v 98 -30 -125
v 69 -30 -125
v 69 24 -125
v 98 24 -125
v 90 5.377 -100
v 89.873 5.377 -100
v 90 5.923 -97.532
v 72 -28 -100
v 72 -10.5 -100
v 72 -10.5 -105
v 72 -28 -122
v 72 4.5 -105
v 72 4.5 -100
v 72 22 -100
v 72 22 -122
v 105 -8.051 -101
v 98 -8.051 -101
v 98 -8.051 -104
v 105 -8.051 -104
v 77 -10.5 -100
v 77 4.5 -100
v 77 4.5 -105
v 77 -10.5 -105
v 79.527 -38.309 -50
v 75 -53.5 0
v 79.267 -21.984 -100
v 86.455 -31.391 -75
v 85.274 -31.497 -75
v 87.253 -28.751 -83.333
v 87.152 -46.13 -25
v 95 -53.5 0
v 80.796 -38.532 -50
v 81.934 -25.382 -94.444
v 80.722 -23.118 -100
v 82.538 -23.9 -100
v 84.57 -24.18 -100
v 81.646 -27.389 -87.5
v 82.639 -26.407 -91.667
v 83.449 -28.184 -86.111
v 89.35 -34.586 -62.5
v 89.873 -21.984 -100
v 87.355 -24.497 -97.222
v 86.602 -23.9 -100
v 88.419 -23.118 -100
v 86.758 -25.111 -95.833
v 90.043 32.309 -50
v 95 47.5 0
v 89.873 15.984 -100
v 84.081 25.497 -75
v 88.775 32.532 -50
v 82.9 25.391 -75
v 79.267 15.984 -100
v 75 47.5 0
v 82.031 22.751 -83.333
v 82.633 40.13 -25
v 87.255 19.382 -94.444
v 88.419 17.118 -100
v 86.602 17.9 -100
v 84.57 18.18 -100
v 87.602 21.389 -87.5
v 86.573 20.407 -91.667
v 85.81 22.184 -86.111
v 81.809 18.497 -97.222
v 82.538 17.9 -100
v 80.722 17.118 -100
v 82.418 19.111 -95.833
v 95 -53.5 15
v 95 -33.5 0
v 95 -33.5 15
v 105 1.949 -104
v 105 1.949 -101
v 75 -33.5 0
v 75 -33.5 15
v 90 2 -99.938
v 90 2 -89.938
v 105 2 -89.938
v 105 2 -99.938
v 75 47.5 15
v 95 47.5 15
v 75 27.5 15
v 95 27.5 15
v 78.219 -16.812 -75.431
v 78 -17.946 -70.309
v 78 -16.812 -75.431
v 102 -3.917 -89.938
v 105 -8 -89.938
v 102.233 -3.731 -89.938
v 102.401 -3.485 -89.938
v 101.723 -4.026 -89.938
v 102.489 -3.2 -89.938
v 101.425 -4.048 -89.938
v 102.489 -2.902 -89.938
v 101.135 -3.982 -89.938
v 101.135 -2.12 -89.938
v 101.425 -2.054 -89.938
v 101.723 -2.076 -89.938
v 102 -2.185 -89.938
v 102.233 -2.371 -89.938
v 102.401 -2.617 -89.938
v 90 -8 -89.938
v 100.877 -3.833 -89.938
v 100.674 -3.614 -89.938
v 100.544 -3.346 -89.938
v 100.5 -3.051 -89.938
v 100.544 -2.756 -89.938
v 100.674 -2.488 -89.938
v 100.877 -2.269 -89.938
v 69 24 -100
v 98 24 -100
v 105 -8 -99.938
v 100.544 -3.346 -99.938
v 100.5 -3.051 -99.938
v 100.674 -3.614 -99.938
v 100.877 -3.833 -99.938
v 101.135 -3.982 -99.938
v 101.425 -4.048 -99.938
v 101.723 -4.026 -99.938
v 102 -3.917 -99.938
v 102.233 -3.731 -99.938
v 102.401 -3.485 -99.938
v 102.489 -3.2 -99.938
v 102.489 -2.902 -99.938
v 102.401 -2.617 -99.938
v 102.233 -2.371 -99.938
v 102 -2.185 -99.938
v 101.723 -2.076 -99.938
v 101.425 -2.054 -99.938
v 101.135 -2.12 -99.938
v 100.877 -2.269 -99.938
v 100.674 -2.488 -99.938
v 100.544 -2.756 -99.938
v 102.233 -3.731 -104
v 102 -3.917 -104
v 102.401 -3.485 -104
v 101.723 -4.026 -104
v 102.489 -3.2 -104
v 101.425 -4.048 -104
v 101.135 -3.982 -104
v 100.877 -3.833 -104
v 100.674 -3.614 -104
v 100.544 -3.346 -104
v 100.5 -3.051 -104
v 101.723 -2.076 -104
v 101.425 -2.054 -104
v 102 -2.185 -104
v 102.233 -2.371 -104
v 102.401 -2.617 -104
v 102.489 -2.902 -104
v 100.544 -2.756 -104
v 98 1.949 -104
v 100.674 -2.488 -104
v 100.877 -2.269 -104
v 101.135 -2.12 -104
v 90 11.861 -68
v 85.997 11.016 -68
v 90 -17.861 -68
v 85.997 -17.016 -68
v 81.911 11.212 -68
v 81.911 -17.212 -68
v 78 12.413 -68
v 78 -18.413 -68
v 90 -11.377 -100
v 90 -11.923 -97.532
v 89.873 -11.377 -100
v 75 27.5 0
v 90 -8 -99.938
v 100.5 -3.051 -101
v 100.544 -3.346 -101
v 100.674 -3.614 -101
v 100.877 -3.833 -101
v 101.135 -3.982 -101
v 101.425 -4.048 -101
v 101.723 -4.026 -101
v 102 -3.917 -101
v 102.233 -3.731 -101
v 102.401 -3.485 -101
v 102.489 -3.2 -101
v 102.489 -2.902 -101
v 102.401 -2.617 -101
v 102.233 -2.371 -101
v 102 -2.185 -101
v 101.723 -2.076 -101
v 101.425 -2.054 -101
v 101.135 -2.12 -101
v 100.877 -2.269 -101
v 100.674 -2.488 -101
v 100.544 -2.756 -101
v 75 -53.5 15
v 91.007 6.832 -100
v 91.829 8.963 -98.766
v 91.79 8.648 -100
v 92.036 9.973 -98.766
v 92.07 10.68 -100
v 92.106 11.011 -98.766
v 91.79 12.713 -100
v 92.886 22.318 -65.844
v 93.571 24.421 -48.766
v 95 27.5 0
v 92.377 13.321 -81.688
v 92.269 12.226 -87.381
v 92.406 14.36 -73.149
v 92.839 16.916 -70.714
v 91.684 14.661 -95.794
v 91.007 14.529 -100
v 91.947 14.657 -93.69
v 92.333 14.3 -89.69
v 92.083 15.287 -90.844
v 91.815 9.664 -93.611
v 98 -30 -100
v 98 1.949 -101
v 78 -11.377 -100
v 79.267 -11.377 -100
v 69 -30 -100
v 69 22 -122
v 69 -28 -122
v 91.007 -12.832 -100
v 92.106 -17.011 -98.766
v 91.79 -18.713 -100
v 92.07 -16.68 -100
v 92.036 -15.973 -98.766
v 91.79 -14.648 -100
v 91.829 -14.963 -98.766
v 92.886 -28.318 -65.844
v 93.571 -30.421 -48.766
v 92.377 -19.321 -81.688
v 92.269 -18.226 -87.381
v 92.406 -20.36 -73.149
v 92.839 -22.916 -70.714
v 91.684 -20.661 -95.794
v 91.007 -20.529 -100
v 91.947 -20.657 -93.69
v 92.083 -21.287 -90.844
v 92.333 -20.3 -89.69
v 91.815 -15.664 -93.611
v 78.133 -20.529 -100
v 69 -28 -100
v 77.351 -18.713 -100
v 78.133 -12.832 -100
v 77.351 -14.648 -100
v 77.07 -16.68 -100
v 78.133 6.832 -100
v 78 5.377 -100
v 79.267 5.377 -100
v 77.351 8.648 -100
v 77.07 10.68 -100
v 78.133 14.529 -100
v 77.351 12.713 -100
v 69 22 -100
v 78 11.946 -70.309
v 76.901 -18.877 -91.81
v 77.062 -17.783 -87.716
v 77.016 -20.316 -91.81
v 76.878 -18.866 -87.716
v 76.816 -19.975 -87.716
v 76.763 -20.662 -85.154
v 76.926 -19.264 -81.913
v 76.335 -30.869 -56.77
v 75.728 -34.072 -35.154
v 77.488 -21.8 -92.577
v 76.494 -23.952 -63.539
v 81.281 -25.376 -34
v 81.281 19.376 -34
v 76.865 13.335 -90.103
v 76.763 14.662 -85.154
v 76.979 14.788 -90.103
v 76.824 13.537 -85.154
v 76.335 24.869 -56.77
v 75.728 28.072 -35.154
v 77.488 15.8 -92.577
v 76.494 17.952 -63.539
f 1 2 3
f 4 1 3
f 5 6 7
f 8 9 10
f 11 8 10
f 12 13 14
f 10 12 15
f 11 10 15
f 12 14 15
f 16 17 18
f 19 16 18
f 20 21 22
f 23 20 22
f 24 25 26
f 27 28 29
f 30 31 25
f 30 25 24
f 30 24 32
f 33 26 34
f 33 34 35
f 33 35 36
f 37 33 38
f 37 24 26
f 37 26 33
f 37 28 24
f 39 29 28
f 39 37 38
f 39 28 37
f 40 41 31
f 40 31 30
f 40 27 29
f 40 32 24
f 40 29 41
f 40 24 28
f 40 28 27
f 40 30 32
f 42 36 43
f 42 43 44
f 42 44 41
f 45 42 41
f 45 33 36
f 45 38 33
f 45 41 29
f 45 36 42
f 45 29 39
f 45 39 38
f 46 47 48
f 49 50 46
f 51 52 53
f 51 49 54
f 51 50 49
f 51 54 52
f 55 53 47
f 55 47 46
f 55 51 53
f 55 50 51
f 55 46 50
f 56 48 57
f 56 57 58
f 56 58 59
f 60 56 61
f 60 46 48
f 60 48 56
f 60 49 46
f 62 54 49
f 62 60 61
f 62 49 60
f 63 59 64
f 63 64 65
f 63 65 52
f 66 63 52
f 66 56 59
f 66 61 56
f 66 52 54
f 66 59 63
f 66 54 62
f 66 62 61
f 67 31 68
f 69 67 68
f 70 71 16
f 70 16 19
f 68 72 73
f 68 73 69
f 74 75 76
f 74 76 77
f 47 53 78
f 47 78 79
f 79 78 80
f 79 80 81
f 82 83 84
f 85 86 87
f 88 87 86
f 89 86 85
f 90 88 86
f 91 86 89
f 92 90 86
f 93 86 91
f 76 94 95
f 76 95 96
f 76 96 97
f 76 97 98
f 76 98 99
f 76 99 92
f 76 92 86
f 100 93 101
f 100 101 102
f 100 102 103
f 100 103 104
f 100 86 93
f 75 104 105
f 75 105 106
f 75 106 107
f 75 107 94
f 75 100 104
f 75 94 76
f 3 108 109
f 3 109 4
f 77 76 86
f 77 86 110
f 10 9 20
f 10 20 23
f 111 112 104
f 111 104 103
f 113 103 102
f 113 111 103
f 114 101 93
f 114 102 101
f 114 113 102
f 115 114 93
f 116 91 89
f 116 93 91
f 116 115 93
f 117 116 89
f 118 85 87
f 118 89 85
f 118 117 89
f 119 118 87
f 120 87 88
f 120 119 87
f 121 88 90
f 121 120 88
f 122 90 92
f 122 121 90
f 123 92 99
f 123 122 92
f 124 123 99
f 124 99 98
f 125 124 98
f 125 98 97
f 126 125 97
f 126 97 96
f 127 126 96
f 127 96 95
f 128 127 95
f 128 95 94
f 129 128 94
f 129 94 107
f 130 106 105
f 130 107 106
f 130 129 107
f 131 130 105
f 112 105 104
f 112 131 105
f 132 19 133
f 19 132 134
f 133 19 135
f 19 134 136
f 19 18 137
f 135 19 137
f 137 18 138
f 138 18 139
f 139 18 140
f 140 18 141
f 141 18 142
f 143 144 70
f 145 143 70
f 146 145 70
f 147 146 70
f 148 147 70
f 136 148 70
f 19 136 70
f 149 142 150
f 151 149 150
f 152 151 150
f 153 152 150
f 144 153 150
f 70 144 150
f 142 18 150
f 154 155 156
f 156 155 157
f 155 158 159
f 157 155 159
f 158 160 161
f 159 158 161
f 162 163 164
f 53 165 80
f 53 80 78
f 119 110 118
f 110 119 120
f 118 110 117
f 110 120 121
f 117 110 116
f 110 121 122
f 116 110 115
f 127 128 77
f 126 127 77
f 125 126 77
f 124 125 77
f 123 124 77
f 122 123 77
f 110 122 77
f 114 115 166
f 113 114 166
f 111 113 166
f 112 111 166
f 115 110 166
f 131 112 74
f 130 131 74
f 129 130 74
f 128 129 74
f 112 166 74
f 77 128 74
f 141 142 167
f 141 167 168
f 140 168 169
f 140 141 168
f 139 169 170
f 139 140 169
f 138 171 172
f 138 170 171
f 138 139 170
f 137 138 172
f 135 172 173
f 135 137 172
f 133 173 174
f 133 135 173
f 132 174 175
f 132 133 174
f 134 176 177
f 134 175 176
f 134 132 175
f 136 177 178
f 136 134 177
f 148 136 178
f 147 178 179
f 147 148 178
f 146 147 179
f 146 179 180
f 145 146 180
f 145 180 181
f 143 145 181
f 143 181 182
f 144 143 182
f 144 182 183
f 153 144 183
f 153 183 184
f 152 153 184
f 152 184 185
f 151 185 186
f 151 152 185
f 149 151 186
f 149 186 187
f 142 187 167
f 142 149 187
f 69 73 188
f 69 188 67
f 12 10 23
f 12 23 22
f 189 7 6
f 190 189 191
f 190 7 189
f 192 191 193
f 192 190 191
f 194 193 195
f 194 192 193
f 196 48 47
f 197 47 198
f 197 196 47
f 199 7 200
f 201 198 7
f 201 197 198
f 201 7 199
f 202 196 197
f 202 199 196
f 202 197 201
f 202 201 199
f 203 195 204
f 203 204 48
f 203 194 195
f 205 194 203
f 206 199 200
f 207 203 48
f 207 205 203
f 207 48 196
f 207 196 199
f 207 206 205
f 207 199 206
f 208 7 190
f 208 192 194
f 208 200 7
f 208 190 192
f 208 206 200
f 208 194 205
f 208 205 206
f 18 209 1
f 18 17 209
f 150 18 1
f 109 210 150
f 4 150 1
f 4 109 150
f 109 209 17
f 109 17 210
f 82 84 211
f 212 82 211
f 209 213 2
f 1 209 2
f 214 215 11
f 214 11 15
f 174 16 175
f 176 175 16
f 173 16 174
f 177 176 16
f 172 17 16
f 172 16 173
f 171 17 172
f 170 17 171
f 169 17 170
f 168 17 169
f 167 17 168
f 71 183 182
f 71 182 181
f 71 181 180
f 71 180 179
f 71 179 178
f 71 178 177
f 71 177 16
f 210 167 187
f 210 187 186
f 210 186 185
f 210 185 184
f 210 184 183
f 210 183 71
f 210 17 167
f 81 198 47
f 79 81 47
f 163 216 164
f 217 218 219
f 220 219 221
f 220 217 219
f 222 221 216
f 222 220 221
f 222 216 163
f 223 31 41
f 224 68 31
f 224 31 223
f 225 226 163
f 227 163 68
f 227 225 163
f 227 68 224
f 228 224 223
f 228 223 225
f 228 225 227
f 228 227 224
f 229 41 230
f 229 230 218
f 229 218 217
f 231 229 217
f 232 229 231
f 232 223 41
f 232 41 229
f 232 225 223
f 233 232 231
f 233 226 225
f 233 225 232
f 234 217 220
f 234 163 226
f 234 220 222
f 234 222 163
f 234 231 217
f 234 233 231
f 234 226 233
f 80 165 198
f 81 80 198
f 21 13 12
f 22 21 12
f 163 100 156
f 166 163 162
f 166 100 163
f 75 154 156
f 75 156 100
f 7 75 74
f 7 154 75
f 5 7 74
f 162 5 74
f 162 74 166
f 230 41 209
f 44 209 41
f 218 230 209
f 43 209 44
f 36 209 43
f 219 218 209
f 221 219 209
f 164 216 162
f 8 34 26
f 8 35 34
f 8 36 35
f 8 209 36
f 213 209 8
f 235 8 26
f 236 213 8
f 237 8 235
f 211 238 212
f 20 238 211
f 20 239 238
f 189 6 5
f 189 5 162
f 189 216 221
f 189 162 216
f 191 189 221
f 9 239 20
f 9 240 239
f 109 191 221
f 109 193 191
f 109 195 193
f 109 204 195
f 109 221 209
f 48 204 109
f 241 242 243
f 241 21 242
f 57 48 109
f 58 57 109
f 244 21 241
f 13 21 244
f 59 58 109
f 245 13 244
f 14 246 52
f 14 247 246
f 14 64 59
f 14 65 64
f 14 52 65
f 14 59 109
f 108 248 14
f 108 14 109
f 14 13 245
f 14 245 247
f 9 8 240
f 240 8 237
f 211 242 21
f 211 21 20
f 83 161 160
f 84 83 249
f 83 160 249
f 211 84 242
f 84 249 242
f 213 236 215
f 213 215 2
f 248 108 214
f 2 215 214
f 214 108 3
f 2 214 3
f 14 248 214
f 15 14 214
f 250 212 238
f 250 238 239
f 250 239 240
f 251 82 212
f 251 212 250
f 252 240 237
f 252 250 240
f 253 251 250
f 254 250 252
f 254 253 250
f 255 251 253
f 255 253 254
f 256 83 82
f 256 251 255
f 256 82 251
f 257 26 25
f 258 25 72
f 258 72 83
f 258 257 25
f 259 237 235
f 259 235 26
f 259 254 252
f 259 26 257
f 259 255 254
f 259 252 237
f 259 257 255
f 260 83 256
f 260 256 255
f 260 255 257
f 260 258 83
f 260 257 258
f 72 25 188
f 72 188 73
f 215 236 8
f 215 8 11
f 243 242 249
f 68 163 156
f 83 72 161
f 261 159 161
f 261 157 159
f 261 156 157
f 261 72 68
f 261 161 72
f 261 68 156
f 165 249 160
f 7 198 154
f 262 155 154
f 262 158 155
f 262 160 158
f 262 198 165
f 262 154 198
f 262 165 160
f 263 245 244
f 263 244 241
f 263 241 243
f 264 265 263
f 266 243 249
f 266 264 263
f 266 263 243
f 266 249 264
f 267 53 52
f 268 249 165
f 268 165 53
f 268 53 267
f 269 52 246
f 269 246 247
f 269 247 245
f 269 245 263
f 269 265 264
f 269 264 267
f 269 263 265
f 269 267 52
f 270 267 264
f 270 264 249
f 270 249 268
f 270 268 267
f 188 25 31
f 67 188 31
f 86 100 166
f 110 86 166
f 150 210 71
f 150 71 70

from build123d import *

# Parameters (mm, degrees)
EXTRUDE_6_DEPTH           = 3
EXTRUDE_6_DEPTH_BACK      = 26
SKETCH_13_W               = 25
SKETCH_13_H               = 54
SKETCH_16_W               = 22
SKETCH_16_H               = 50
CUT_EXTRUDE_9_DEPTH       = 3
SKETCH_17_W               = 5
SKETCH_17_H               = 15
CUT_EXTRUDE_10_DEPTH      = 8
EXTRUDE_14_OUTLINE_W      = 20
EXTRUDE_14_OUTLINE_H      = 20
EXTRUDE_14_DEPTH          = 15
EXTRUDE_14_3_OUTLINE_W    = 20
EXTRUDE_14_3_OUTLINE_H    = 20
EXTRUDE_14_3_DEPTH        = 15
EXTRUDE_15_DEPTH          = 5
EXTRUDE_15_DEPTH_BACK     = 7
SKETCH_25_W               = 10
SKETCH_25_H               = 10
EXTRUDE_17_DEPTH          = 20
SKETCH_26_W               = 3
SKETCH_26_H               = 10
EXTRUDE_18_DEPTH          = 10
CUT_EXTRUDE_11_DEPTH      = 10.5
CUT_EXTRUDE_11_DEPTH_BACK = 10.5
SKETCH_28_R               = 1


with BuildPart() as part:
    # 草圖13 → 填料-伸長6 (new, two sides: drawn at the far end of the back side and taken through both)
    with BuildSketch(Plane(origin=(95, 0, 0), x_dir=(0, 0, -1), z_dir=(1, 0, 0)).offset(-EXTRUDE_6_DEPTH_BACK)):
        with Locations((112.5, -3)):
            Rectangle(SKETCH_13_W, SKETCH_13_H)
    extrude(amount=EXTRUDE_6_DEPTH + EXTRUDE_6_DEPTH_BACK)

    # 草圖16 → 除料-伸長9 (cut)
    with BuildSketch(Plane(origin=(69, 0, 0), x_dir=(0, 0, -1), z_dir=(1, 0, 0))):
        with Locations((111, -3)):
            Rectangle(SKETCH_16_W, SKETCH_16_H)
    extrude(amount=CUT_EXTRUDE_9_DEPTH, mode=Mode.SUBTRACT)

    # 草圖17 → 除料-伸長10 (cut)
    with BuildSketch(Plane(origin=(69, 0, 0), x_dir=(0, 0, -1), z_dir=(1, 0, 0))):
        with Locations((102.5, -3)):
            Rectangle(SKETCH_17_W, SKETCH_17_H)
    extrude(amount=CUT_EXTRUDE_10_DEPTH, mode=Mode.SUBTRACT)



with BuildPart() as body_2:
    # Knit 1: read off the stored shape, not the designer's step
    # Knit 1: loft between two sections, ruled curve by curve
    knit_1_from = [
        Edge.make_bspline([(79.266895317, 5.377196179, -100), (79.579395317, 5.064696179, -100), (79.931362244, 4.768290315, -100), (80.709511323, 4.233165726, -100), (81.135733214, 3.994620259, -100), (82.046998926, 3.600245646, -100), (82.531971403, 3.444609801, -100), (83.534778832, 3.234670337, -100), (84.052429223, 3.180497037, -100), (85.087963129, 3.180497037, -100), (85.60561352, 3.234670337, -100), (86.608420949, 3.444609801, -100), (87.093393426, 3.600245646, -100), (88.004659138, 3.994620259, -100), (88.430881029, 4.233165726, -100), (89.209030109, 4.768290315, -100), (89.560997035, 5.064696179, -100), (89.873497035, 5.377196179, -100)], [0, 0, 0, 0, 0.125, 0.125, 0.25, 0.25, 0.375, 0.375, 0.5, 0.5, 0.625, 0.625, 0.75, 0.75, 0.875, 0.875, 1, 1, 1, 1], 3),
        Edge.make_bspline([(89.873497035, 5.377196179, -100), (90.185997035, 5.689696179, -100), (90.482402899, 6.041663105, -100), (91.017527488, 6.819812184, -100), (91.256072955, 7.246034075, -100), (91.650447568, 8.157299787, -100), (91.806083413, 8.642272265, -100), (92.016022877, 9.645079694, -100), (92.070196176, 10.162730084, -100), (92.070196176, 11.19826399, -100), (92.016022877, 11.715914381, -100), (91.806083413, 12.71872181, -100), (91.650447568, 13.203694288, -100), (91.256072955, 14.11496, -100), (91.017527488, 14.541181891, -100), (90.482402899, 15.31933097, -100), (90.185997035, 15.671297896, -100), (89.873497035, 15.983797896, -100)], [0, 0, 0, 0, 0.125, 0.125, 0.25, 0.25, 0.375, 0.375, 0.5, 0.5, 0.625, 0.625, 0.75, 0.75, 0.875, 0.875, 1, 1, 1, 1], 3),
        Edge.make_bspline([(79.266895317, 15.983797896, -100), (78.954395317, 15.671297896, -100), (78.657989454, 15.31933097, -100), (78.122864864, 14.541181891, -100), (77.884319398, 14.11496, -100), (77.489944785, 13.203694288, -100), (77.334308939, 12.71872181, -100), (77.124369476, 11.715914381, -100), (77.070196176, 11.19826399, -100), (77.070196176, 10.162730084, -100), (77.124369476, 9.645079694, -100), (77.334308939, 8.642272265, -100), (77.489944785, 8.157299787, -100), (77.884319398, 7.246034075, -100), (78.122864864, 6.819812184, -100), (78.657989454, 6.041663105, -100), (78.954395317, 5.689696179, -100), (79.266895317, 5.377196179, -100)], [0, 0, 0, 0, 0.125, 0.125, 0.25, 0.25, 0.375, 0.375, 0.5, 0.5, 0.625, 0.625, 0.75, 0.75, 0.875, 0.875, 1, 1, 1, 1], 3),
        Edge.make_bspline([(89.873497035, 15.983797896, -100), (89.560997035, 16.296297896, -100), (89.209030109, 16.59270376, -100), (88.430881029, 17.127828349, -100), (88.004659138, 17.366373816, -100), (87.093393426, 17.760748429, -100), (86.608420949, 17.916384274, -100), (85.60561352, 18.126323738, -100), (85.087963129, 18.180497037, -100), (84.052429223, 18.180497037, -100), (83.534778832, 18.126323738, -100), (82.531971403, 17.916384274, -100), (82.046998926, 17.760748429, -100), (81.135733214, 17.366373816, -100), (80.709511323, 17.127828349, -100), (79.931362244, 16.59270376, -100), (79.579395317, 16.296297896, -100), (79.266895317, 15.983797896, -100)], [0, 0, 0, 0, 0.125, 0.125, 0.25, 0.25, 0.375, 0.375, 0.5, 0.5, 0.625, 0.625, 0.75, 0.75, 0.875, 0.875, 1, 1, 1, 1], 3),
    ]
    knit_1_to = [
        Edge.make_bspline([(75, 27.5, 0), (75.833333333, 27.5, 0), (76.666666667, 27.5, 0), (78.333333333, 27.5, 0), (79.166666667, 27.5, 0), (80.833333333, 27.5, 0), (81.666666667, 27.5, 0), (83.333333333, 27.5, 0), (84.166666667, 27.5, 0), (85.833333333, 27.5, 0), (86.666666667, 27.5, 0), (88.333333333, 27.5, 0), (89.166666667, 27.5, 0), (90.833333333, 27.5, 0), (91.666666667, 27.5, 0), (93.333333333, 27.5, 0), (94.166666667, 27.5, 0), (95, 27.5, 0)], [0, 0, 0, 0, 0.125, 0.125, 0.25, 0.25, 0.375, 0.375, 0.5, 0.5, 0.625, 0.625, 0.75, 0.75, 0.875, 0.875, 1, 1, 1, 1], 3),
        Edge.make_bspline([(95, 27.5, 0), (95, 28.333333333, 0), (95, 29.166666667, 0), (95, 30.833333333, 0), (95, 31.666666667, 0), (95, 33.333333333, 0), (95, 34.166666667, 0), (95, 35.833333333, 0), (95, 36.666666667, 0), (95, 38.333333333, 0), (95, 39.166666667, 0), (95, 40.833333333, 0), (95, 41.666666667, 0), (95, 43.333333333, 0), (95, 44.166666667, 0), (95, 45.833333333, 0), (95, 46.666666667, 0), (95, 47.5, 0)], [0, 0, 0, 0, 0.125, 0.125, 0.25, 0.25, 0.375, 0.375, 0.5, 0.5, 0.625, 0.625, 0.75, 0.75, 0.875, 0.875, 1, 1, 1, 1], 3),
        Edge.make_bspline([(75, 47.5, 0), (75, 46.666666667, 0), (75, 45.833333333, 0), (75, 44.166666667, 0), (75, 43.333333333, 0), (75, 41.666666667, 0), (75, 40.833333333, 0), (75, 39.166666667, 0), (75, 38.333333333, 0), (75, 36.666666667, 0), (75, 35.833333333, 0), (75, 34.166666667, 0), (75, 33.333333333, 0), (75, 31.666666667, 0), (75, 30.833333333, 0), (75, 29.166666667, 0), (75, 28.333333333, 0), (75, 27.5, 0)], [0, 0, 0, 0, 0.125, 0.125, 0.25, 0.25, 0.375, 0.375, 0.5, 0.5, 0.625, 0.625, 0.75, 0.75, 0.875, 0.875, 1, 1, 1, 1], 3),
        Edge.make_bspline([(95, 47.5, 0), (94.166666667, 47.5, 0), (93.333333333, 47.5, 0), (91.666666667, 47.5, 0), (90.833333333, 47.5, 0), (89.166666667, 47.5, 0), (88.333333333, 47.5, 0), (86.666666667, 47.5, 0), (85.833333333, 47.5, 0), (84.166666667, 47.5, 0), (83.333333333, 47.5, 0), (81.666666667, 47.5, 0), (80.833333333, 47.5, 0), (79.166666667, 47.5, 0), (78.333333333, 47.5, 0), (76.666666667, 47.5, 0), (75.833333333, 47.5, 0), (75, 47.5, 0)], [0, 0, 0, 0, 0.125, 0.125, 0.25, 0.25, 0.375, 0.375, 0.5, 0.5, 0.625, 0.625, 0.75, 0.75, 0.875, 0.875, 1, 1, 1, 1], 3),
    ]
    knit_1 = Solid(Shell([*[Face.make_surface_from_curves(knit_1_from[k], knit_1_to[k]) for k in range(4)], Face(Wire(knit_1_from)), Face(Wire(knit_1_to))]))
    add(knit_1)

    # Extrude 14 3 outline → Extrude 14 3 (add)
    with BuildSketch(Plane.XY):
        with Locations((85, 37.5)):
            Rectangle(EXTRUDE_14_3_OUTLINE_W, EXTRUDE_14_3_OUTLINE_H)
    extrude(amount=EXTRUDE_14_3_DEPTH)


with BuildPart() as body_3:
    # 填料-伸長14: read off the stored shape, not the designer's step
    # 填料-伸長14 outline → 填料-伸長14 (new body)
    with BuildSketch(Plane.XY):
        with Locations((85, -43.5)):
            Rectangle(EXTRUDE_14_OUTLINE_W, EXTRUDE_14_OUTLINE_H)
    extrude(amount=EXTRUDE_14_DEPTH)

    # Extrude 14 2: loft between two sections, ruled curve by curve
    extrude_14_2_from = [
        Edge.make_bspline([(79.266895317, -21.983797896, -100), (79.579395317, -22.296297896, -100), (79.931362244, -22.59270376, -100), (80.709511323, -23.127828349, -100), (81.135733214, -23.366373816, -100), (82.046998926, -23.760748429, -100), (82.531971403, -23.916384274, -100), (83.534778832, -24.126323738, -100), (84.052429223, -24.180497037, -100), (85.087963129, -24.180497037, -100), (85.60561352, -24.126323738, -100), (86.608420949, -23.916384274, -100), (87.093393426, -23.760748429, -100), (88.004659138, -23.366373816, -100), (88.430881029, -23.127828349, -100), (89.209030109, -22.59270376, -100), (89.560997035, -22.296297896, -100), (89.873497035, -21.983797896, -100)], [0, 0, 0, 0, 0.125, 0.125, 0.25, 0.25, 0.375, 0.375, 0.5, 0.5, 0.625, 0.625, 0.75, 0.75, 0.875, 0.875, 1, 1, 1, 1], 3),
        Edge.make_bspline([(89.873497035, -21.983797896, -100), (90.185997035, -21.671297896, -100), (90.482402899, -21.31933097, -100), (91.017527488, -20.541181891, -100), (91.256072955, -20.11496, -100), (91.650447568, -19.203694288, -100), (91.806083413, -18.71872181, -100), (92.016022877, -17.715914381, -100), (92.070196176, -17.19826399, -100), (92.070196176, -16.162730084, -100), (92.016022877, -15.645079694, -100), (91.806083413, -14.642272265, -100), (91.650447568, -14.157299787, -100), (91.256072955, -13.246034075, -100), (91.017527488, -12.819812184, -100), (90.482402899, -12.041663105, -100), (90.185997035, -11.689696179, -100), (89.873497035, -11.377196179, -100)], [0, 0, 0, 0, 0.125, 0.125, 0.25, 0.25, 0.375, 0.375, 0.5, 0.5, 0.625, 0.625, 0.75, 0.75, 0.875, 0.875, 1, 1, 1, 1], 3),
        Edge.make_bspline([(79.266895317, -11.377196179, -100), (78.954395317, -11.689696179, -100), (78.657989454, -12.041663105, -100), (78.122864864, -12.819812184, -100), (77.884319398, -13.246034075, -100), (77.489944785, -14.157299787, -100), (77.334308939, -14.642272265, -100), (77.124369476, -15.645079694, -100), (77.070196176, -16.162730084, -100), (77.070196176, -17.19826399, -100), (77.124369476, -17.715914381, -100), (77.334308939, -18.71872181, -100), (77.489944785, -19.203694288, -100), (77.884319398, -20.11496, -100), (78.122864864, -20.541181891, -100), (78.657989454, -21.31933097, -100), (78.954395317, -21.671297896, -100), (79.266895317, -21.983797896, -100)], [0, 0, 0, 0, 0.125, 0.125, 0.25, 0.25, 0.375, 0.375, 0.5, 0.5, 0.625, 0.625, 0.75, 0.75, 0.875, 0.875, 1, 1, 1, 1], 3),
        Edge.make_bspline([(89.873497035, -11.377196179, -100), (89.560997035, -11.064696179, -100), (89.209030109, -10.768290315, -100), (88.430881029, -10.233165726, -100), (88.004659138, -9.994620259, -100), (87.093393426, -9.600245646, -100), (86.608420949, -9.444609801, -100), (85.60561352, -9.234670337, -100), (85.087963129, -9.180497037, -100), (84.052429223, -9.180497037, -100), (83.534778832, -9.234670337, -100), (82.531971403, -9.444609801, -100), (82.046998926, -9.600245646, -100), (81.135733214, -9.994620259, -100), (80.709511323, -10.233165726, -100), (79.931362244, -10.768290315, -100), (79.579395317, -11.064696179, -100), (79.266895317, -11.377196179, -100)], [0, 0, 0, 0, 0.125, 0.125, 0.25, 0.25, 0.375, 0.375, 0.5, 0.5, 0.625, 0.625, 0.75, 0.75, 0.875, 0.875, 1, 1, 1, 1], 3),
    ]
    extrude_14_2_to = [
        Edge.make_bspline([(75, -53.5, 0), (75.833333333, -53.5, 0), (76.666666667, -53.5, 0), (78.333333333, -53.5, 0), (79.166666667, -53.5, 0), (80.833333333, -53.5, 0), (81.666666667, -53.5, 0), (83.333333333, -53.5, 0), (84.166666667, -53.5, 0), (85.833333333, -53.5, 0), (86.666666667, -53.5, 0), (88.333333333, -53.5, 0), (89.166666667, -53.5, 0), (90.833333333, -53.5, 0), (91.666666667, -53.5, 0), (93.333333333, -53.5, 0), (94.166666667, -53.5, 0), (95, -53.5, 0)], [0, 0, 0, 0, 0.125, 0.125, 0.25, 0.25, 0.375, 0.375, 0.5, 0.5, 0.625, 0.625, 0.75, 0.75, 0.875, 0.875, 1, 1, 1, 1], 3),
        Edge.make_bspline([(95, -53.5, 0), (95, -52.666666667, 0), (95, -51.833333333, 0), (95, -50.166666667, 0), (95, -49.333333333, 0), (95, -47.666666667, 0), (95, -46.833333333, 0), (95, -45.166666667, 0), (95, -44.333333333, 0), (95, -42.666666667, 0), (95, -41.833333333, 0), (95, -40.166666667, 0), (95, -39.333333333, 0), (95, -37.666666667, 0), (95, -36.833333333, 0), (95, -35.166666667, 0), (95, -34.333333333, 0), (95, -33.5, 0)], [0, 0, 0, 0, 0.125, 0.125, 0.25, 0.25, 0.375, 0.375, 0.5, 0.5, 0.625, 0.625, 0.75, 0.75, 0.875, 0.875, 1, 1, 1, 1], 3),
        Edge.make_bspline([(75, -33.5, 0), (75, -34.333333333, 0), (75, -35.166666667, 0), (75, -36.833333333, 0), (75, -37.666666667, 0), (75, -39.333333333, 0), (75, -40.166666667, 0), (75, -41.833333333, 0), (75, -42.666666667, 0), (75, -44.333333333, 0), (75, -45.166666667, 0), (75, -46.833333333, 0), (75, -47.666666667, 0), (75, -49.333333333, 0), (75, -50.166666667, 0), (75, -51.833333333, 0), (75, -52.666666667, 0), (75, -53.5, 0)], [0, 0, 0, 0, 0.125, 0.125, 0.25, 0.25, 0.375, 0.375, 0.5, 0.5, 0.625, 0.625, 0.75, 0.75, 0.875, 0.875, 1, 1, 1, 1], 3),
        Edge.make_bspline([(95, -33.5, 0), (94.166666667, -33.5, 0), (93.333333333, -33.5, 0), (91.666666667, -33.5, 0), (90.833333333, -33.5, 0), (89.166666667, -33.5, 0), (88.333333333, -33.5, 0), (86.666666667, -33.5, 0), (85.833333333, -33.5, 0), (84.166666667, -33.5, 0), (83.333333333, -33.5, 0), (81.666666667, -33.5, 0), (80.833333333, -33.5, 0), (79.166666667, -33.5, 0), (78.333333333, -33.5, 0), (76.666666667, -33.5, 0), (75.833333333, -33.5, 0), (75, -33.5, 0)], [0, 0, 0, 0, 0.125, 0.125, 0.25, 0.25, 0.375, 0.375, 0.5, 0.5, 0.625, 0.625, 0.75, 0.75, 0.875, 0.875, 1, 1, 1, 1], 3),
    ]
    extrude_14_2 = Solid(Shell([*[Face.make_surface_from_curves(extrude_14_2_from[k], extrude_14_2_to[k]) for k in range(4)], Face(Wire(extrude_14_2_from)), Face(Wire(extrude_14_2_to))]))
    add(extrude_14_2)


with BuildPart() as part_1:
    add(part.part)

    add(body_2.part)  # 填料-伸長15 merges body 2

    add(body_3.part)  # 填料-伸長15 merges body 3
    # 草圖23 → 填料-伸長15 (add, two sides: drawn at the far end of the back side and taken through both)
    with BuildSketch(Plane(origin=(85, 0, 0), x_dir=(0, 0, -1), z_dir=(1, 0, 0)).offset(-EXTRUDE_15_DEPTH_BACK)):
        Polygon((75.431487816, -16.812439931), (100, -11.377196179), (100, 3.180497037), (100, 5.377196179), (68, 12.456493401), (68, -18.456493401), align=None)
    extrude(amount=EXTRUDE_15_DEPTH + EXTRUDE_15_DEPTH_BACK)

    # 草圖25 → 填料-伸長17 (add)
    with BuildSketch(Plane(origin=(85, 0, 0), x_dir=(0, 0, -1), z_dir=(1, 0, 0))):
        with Locations((94.938395857, -3)):
            Rectangle(SKETCH_25_W, SKETCH_25_H)
    extrude(amount=EXTRUDE_17_DEPTH)

    # 草圖26 → 填料-伸長18 (add)
    with BuildSketch(Plane(origin=(95, 0, 0), x_dir=(0, 0, -1), z_dir=(1, 0, 0))):
        with Locations((102.5, -3.051173544)):
            Rectangle(SKETCH_26_W, SKETCH_26_H)
    extrude(amount=EXTRUDE_18_DEPTH)

    # 草圖28 → 除料-伸長11 (cut, two sides: drawn at the far end of the back side and taken through both)
    with BuildSketch(Plane.XY.offset(-100).offset(-CUT_EXTRUDE_11_DEPTH_BACK)):
        with Locations(Location((101.5, -3.051173544, 0), (0, 0, 180))):
            Circle(SKETCH_28_R)
    extrude(amount=CUT_EXTRUDE_11_DEPTH + CUT_EXTRUDE_11_DEPTH_BACK, mode=Mode.SUBTRACT)


solid = part_1.part
